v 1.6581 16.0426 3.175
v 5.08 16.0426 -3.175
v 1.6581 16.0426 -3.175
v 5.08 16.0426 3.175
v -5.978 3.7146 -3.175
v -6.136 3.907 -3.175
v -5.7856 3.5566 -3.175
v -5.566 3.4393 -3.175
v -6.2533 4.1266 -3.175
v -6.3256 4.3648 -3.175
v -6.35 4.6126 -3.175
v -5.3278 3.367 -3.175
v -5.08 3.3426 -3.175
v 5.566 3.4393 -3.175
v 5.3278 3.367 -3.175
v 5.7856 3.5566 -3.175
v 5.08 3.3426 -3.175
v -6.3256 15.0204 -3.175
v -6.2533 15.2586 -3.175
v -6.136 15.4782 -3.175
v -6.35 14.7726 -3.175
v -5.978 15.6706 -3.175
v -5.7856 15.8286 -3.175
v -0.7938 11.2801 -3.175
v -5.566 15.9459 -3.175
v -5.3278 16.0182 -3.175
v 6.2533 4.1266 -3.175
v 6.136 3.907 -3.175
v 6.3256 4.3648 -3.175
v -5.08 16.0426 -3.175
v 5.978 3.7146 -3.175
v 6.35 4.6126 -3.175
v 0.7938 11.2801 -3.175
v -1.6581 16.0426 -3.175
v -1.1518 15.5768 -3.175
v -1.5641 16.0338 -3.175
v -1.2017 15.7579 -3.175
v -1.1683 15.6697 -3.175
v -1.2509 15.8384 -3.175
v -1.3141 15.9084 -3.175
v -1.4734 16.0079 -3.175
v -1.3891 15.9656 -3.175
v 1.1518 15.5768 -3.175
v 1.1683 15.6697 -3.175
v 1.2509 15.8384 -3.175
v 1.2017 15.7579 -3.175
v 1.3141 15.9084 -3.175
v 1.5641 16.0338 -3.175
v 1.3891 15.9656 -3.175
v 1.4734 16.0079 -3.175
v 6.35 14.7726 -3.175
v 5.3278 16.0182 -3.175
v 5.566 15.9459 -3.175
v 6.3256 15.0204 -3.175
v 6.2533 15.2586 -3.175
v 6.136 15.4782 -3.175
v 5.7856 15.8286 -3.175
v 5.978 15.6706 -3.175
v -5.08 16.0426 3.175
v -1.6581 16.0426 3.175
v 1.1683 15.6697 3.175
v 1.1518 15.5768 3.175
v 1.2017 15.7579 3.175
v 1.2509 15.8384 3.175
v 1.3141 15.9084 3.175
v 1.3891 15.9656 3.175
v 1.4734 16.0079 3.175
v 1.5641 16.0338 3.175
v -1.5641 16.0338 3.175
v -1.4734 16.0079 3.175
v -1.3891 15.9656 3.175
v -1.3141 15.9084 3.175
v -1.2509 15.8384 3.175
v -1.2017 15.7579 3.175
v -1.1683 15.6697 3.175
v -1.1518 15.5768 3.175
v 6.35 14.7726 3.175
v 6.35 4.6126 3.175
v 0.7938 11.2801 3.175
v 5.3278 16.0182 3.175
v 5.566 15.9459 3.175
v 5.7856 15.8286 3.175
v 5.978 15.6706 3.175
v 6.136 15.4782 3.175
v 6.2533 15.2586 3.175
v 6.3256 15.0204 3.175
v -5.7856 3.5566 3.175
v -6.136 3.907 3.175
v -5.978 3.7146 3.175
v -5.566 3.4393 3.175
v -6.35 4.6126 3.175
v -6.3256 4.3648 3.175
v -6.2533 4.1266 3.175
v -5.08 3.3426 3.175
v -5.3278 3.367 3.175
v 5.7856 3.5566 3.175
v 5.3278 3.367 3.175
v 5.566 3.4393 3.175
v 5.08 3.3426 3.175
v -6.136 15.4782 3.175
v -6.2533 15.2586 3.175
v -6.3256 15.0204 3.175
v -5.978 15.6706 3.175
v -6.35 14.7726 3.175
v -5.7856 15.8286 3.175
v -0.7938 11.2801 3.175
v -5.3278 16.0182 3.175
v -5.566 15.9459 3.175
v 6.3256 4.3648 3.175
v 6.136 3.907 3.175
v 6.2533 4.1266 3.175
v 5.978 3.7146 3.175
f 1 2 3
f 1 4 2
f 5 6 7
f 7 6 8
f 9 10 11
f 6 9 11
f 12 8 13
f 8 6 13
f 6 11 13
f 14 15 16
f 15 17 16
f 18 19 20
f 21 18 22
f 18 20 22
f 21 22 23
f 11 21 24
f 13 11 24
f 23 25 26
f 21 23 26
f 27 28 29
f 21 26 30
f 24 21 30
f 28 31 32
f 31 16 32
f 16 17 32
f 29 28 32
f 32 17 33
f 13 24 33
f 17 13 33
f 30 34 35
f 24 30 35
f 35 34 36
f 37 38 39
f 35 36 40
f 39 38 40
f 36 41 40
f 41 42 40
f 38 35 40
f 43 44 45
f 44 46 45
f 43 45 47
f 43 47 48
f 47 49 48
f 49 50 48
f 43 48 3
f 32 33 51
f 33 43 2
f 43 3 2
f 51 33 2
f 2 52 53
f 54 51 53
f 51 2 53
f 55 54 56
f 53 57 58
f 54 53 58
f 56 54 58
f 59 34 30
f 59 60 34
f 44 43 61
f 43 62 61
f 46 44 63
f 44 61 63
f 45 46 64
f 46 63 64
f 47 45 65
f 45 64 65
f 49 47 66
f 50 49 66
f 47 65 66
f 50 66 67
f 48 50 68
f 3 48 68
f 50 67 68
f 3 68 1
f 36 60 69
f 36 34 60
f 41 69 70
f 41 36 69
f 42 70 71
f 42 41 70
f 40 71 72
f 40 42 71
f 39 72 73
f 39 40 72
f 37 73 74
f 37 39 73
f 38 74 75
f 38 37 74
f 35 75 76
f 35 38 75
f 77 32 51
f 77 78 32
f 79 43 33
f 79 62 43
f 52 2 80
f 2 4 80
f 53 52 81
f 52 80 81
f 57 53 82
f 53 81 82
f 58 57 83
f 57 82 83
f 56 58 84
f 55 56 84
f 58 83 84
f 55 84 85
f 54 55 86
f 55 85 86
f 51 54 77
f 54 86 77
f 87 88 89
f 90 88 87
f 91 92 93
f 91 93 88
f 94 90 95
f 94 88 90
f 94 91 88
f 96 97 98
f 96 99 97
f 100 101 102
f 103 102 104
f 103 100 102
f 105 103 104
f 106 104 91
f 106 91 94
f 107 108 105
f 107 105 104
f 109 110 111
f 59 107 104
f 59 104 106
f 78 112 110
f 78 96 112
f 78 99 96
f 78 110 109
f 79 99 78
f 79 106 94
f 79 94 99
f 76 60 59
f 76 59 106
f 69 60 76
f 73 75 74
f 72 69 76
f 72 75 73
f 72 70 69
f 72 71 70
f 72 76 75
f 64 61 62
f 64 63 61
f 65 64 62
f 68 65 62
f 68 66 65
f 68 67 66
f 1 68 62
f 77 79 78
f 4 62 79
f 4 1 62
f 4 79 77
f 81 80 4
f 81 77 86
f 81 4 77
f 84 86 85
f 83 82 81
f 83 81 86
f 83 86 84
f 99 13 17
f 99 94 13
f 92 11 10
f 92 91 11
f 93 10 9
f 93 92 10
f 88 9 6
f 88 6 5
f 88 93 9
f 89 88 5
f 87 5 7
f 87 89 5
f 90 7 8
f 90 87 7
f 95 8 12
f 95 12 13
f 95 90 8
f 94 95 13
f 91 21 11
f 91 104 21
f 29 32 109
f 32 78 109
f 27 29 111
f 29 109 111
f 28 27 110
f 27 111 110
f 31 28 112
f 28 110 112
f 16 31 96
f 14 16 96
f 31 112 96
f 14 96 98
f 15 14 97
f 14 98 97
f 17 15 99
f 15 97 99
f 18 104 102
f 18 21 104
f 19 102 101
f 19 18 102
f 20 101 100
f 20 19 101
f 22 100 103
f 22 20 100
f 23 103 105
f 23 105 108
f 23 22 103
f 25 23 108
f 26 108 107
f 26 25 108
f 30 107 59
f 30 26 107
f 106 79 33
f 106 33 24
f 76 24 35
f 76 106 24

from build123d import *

# Parameters (mm, degrees)
F1_DEPTH = 3.175
F2_R     = 1.27
F3_R     = 0.508


with BuildPart() as f1:
    # F0 (on Top) → F1 (new body, symmetric)
    with BuildSketch(Plane.XY):
        Polygon((-6.35, 16.042595), (-6.35, 3.342595), (6.35, 3.342595), (6.35, 16.042595), (1.190625, 16.042595), (0.79375, 11.280095), (-0.79375, 11.280095), (-1.190625, 16.042595), align=None)
    extrude(amount=F1_DEPTH, both=True)

    # F2
    f2_edges = [f1.edges().sort_by_distance(p)[0] for p in [
        (-6.35, 3.342595, 0),
        (6.35, 3.342595, 0),
        (6.35, 16.042595, 0),
        (-6.35, 16.042595, 0),
    ]]
    fillet(f2_edges, radius=F2_R)

    # F3
    f3_edges = [f1.edges().sort_by_distance(p)[0] for p in [
        (1.190625, 16.042595, 0),
        (-1.190625, 16.042595, 0),
    ]]
    fillet(f3_edges, radius=F3_R)


solid = f1.part
